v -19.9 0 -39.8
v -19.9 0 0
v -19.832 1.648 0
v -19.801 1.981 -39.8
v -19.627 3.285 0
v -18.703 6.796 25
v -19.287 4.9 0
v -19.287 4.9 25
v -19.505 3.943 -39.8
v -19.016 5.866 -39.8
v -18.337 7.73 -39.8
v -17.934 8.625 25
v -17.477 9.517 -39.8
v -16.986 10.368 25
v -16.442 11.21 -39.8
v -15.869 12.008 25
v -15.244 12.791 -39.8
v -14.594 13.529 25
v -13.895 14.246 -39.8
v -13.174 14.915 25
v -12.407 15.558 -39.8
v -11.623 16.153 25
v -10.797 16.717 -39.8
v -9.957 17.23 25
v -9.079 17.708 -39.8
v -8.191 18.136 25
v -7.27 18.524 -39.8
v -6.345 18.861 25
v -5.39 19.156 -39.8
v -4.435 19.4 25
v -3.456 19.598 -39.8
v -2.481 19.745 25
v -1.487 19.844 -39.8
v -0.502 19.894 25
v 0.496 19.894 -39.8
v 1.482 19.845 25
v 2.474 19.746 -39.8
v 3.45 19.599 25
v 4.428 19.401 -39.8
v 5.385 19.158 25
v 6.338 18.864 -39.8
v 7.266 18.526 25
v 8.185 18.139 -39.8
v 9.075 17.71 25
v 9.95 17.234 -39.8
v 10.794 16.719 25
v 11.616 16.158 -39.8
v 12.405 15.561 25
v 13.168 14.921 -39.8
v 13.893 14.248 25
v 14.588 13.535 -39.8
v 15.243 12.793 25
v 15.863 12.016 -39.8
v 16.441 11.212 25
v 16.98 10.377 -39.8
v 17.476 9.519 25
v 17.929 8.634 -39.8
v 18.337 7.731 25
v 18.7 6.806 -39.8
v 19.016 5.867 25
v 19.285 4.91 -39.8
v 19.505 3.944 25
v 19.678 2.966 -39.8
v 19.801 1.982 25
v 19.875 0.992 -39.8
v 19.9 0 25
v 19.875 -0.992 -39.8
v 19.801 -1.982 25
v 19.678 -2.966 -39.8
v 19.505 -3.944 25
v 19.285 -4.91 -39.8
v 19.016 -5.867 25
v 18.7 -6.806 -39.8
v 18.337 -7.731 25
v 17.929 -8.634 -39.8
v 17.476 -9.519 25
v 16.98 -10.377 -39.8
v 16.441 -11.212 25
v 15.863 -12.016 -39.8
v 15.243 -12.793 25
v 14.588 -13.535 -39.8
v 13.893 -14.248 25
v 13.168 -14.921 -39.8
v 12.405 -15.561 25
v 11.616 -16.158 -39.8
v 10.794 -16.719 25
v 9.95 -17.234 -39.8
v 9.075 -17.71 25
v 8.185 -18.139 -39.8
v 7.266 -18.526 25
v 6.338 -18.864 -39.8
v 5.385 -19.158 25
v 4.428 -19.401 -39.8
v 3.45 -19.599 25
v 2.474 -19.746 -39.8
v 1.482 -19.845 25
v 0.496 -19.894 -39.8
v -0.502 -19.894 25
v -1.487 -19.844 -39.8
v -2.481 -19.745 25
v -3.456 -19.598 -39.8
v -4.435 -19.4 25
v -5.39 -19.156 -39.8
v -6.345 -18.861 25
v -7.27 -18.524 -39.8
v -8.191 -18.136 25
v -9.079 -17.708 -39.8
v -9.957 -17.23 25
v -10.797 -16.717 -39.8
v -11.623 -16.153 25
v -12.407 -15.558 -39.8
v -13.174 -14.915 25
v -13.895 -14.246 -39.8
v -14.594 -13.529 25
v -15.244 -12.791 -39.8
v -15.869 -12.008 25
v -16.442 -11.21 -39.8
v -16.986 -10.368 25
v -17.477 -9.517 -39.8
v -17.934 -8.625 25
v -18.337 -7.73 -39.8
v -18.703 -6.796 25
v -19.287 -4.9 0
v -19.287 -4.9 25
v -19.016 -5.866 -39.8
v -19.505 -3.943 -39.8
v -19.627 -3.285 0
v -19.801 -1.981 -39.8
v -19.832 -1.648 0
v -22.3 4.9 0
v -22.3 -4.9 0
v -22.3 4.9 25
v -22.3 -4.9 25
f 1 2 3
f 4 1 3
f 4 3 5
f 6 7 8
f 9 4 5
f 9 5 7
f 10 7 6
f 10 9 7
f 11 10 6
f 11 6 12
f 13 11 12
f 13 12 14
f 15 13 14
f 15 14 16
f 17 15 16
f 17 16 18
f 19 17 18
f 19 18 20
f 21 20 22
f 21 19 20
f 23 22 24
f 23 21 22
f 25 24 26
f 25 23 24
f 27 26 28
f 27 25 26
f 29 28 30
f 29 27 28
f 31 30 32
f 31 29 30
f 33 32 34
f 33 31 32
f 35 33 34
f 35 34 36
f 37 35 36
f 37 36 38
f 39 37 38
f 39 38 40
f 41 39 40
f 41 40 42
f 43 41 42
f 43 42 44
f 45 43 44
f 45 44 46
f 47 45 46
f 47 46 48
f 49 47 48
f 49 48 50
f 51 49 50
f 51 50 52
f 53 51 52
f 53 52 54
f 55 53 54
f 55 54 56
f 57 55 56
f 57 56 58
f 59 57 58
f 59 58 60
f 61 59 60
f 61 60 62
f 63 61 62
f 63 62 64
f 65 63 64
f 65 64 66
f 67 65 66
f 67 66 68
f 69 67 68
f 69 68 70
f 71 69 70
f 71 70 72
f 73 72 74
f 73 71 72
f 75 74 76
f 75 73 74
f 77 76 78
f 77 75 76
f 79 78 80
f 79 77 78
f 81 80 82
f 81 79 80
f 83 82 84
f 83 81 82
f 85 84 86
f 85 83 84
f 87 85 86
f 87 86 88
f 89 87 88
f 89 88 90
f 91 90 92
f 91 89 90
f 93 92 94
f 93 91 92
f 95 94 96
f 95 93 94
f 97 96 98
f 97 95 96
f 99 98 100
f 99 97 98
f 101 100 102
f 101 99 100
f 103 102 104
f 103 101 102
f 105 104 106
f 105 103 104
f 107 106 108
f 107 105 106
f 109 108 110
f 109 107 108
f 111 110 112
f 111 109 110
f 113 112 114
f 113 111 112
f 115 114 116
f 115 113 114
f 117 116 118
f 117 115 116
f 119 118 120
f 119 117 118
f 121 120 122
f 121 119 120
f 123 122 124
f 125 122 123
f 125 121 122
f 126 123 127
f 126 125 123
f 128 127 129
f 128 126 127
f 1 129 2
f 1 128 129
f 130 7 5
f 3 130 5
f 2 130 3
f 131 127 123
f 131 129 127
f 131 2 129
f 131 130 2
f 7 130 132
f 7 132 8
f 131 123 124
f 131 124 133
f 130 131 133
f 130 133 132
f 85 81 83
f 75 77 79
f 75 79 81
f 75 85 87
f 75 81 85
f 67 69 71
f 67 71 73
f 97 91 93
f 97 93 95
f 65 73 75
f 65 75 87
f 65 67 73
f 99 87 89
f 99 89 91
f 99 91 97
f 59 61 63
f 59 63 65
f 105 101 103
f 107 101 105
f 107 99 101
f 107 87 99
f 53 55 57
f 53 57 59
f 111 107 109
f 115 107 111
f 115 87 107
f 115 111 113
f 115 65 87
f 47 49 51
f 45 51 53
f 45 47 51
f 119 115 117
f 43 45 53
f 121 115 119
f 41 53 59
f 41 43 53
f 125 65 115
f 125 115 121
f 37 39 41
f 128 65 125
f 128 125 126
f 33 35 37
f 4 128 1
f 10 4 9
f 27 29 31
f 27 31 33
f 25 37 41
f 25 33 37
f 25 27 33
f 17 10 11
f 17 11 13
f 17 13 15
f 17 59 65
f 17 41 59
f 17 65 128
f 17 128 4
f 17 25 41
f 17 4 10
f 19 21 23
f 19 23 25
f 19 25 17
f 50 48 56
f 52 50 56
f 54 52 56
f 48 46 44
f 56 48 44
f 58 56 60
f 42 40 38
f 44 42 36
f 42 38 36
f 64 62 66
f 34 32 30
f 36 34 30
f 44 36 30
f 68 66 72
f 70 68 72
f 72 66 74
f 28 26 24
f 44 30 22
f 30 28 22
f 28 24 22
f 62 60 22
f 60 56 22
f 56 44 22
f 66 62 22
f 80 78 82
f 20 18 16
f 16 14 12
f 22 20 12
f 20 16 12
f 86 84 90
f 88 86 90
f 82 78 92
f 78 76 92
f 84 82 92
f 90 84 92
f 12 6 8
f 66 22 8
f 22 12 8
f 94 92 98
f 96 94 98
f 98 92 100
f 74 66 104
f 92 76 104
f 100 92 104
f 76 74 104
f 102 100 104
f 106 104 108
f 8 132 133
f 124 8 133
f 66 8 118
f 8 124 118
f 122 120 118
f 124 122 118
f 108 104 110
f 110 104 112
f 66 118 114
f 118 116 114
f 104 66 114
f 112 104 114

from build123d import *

# Parameters (mm, degrees)
BOSS_EXTRUDE1_DEPTH = 25
BOSS_EXTRUDE3_START = 39.8
SKETCH2_R           = 19.9
BOSS_EXTRUDE3_DEPTH = 39.8


with BuildPart() as part:
    # Sketch1 → Boss-Extrude1 (new body)
    with BuildSketch(Plane(origin=(0, 0, 0), x_dir=(0, 1, 0), z_dir=(0, 0, 1))):
        with BuildLine():
            Line((-4.9, 22.3), (4.9, 22.3))
            Line((4.9, 22.3), (4.9, 19.287301522))
            ThreePointArc((4.9, 19.287301522), (0, -19.9), (-4.9, 19.287301522))
            Line((-4.9, 19.287301522), (-4.9, 22.3))
        make_face()
    extrude(amount=BOSS_EXTRUDE1_DEPTH)

    # Sketch2 → Boss-Extrude3 (add)
    with BuildSketch(Plane(origin=(0, 0, 0), x_dir=(1, 0, 0), z_dir=(0, 0, -1)).offset(BOSS_EXTRUDE3_START)):
        with Locations(Location((0, 0, 0), (0, 0, 180))):
            Circle(SKETCH2_R)
    extrude(amount=-BOSS_EXTRUDE3_DEPTH)


solid = part.part
